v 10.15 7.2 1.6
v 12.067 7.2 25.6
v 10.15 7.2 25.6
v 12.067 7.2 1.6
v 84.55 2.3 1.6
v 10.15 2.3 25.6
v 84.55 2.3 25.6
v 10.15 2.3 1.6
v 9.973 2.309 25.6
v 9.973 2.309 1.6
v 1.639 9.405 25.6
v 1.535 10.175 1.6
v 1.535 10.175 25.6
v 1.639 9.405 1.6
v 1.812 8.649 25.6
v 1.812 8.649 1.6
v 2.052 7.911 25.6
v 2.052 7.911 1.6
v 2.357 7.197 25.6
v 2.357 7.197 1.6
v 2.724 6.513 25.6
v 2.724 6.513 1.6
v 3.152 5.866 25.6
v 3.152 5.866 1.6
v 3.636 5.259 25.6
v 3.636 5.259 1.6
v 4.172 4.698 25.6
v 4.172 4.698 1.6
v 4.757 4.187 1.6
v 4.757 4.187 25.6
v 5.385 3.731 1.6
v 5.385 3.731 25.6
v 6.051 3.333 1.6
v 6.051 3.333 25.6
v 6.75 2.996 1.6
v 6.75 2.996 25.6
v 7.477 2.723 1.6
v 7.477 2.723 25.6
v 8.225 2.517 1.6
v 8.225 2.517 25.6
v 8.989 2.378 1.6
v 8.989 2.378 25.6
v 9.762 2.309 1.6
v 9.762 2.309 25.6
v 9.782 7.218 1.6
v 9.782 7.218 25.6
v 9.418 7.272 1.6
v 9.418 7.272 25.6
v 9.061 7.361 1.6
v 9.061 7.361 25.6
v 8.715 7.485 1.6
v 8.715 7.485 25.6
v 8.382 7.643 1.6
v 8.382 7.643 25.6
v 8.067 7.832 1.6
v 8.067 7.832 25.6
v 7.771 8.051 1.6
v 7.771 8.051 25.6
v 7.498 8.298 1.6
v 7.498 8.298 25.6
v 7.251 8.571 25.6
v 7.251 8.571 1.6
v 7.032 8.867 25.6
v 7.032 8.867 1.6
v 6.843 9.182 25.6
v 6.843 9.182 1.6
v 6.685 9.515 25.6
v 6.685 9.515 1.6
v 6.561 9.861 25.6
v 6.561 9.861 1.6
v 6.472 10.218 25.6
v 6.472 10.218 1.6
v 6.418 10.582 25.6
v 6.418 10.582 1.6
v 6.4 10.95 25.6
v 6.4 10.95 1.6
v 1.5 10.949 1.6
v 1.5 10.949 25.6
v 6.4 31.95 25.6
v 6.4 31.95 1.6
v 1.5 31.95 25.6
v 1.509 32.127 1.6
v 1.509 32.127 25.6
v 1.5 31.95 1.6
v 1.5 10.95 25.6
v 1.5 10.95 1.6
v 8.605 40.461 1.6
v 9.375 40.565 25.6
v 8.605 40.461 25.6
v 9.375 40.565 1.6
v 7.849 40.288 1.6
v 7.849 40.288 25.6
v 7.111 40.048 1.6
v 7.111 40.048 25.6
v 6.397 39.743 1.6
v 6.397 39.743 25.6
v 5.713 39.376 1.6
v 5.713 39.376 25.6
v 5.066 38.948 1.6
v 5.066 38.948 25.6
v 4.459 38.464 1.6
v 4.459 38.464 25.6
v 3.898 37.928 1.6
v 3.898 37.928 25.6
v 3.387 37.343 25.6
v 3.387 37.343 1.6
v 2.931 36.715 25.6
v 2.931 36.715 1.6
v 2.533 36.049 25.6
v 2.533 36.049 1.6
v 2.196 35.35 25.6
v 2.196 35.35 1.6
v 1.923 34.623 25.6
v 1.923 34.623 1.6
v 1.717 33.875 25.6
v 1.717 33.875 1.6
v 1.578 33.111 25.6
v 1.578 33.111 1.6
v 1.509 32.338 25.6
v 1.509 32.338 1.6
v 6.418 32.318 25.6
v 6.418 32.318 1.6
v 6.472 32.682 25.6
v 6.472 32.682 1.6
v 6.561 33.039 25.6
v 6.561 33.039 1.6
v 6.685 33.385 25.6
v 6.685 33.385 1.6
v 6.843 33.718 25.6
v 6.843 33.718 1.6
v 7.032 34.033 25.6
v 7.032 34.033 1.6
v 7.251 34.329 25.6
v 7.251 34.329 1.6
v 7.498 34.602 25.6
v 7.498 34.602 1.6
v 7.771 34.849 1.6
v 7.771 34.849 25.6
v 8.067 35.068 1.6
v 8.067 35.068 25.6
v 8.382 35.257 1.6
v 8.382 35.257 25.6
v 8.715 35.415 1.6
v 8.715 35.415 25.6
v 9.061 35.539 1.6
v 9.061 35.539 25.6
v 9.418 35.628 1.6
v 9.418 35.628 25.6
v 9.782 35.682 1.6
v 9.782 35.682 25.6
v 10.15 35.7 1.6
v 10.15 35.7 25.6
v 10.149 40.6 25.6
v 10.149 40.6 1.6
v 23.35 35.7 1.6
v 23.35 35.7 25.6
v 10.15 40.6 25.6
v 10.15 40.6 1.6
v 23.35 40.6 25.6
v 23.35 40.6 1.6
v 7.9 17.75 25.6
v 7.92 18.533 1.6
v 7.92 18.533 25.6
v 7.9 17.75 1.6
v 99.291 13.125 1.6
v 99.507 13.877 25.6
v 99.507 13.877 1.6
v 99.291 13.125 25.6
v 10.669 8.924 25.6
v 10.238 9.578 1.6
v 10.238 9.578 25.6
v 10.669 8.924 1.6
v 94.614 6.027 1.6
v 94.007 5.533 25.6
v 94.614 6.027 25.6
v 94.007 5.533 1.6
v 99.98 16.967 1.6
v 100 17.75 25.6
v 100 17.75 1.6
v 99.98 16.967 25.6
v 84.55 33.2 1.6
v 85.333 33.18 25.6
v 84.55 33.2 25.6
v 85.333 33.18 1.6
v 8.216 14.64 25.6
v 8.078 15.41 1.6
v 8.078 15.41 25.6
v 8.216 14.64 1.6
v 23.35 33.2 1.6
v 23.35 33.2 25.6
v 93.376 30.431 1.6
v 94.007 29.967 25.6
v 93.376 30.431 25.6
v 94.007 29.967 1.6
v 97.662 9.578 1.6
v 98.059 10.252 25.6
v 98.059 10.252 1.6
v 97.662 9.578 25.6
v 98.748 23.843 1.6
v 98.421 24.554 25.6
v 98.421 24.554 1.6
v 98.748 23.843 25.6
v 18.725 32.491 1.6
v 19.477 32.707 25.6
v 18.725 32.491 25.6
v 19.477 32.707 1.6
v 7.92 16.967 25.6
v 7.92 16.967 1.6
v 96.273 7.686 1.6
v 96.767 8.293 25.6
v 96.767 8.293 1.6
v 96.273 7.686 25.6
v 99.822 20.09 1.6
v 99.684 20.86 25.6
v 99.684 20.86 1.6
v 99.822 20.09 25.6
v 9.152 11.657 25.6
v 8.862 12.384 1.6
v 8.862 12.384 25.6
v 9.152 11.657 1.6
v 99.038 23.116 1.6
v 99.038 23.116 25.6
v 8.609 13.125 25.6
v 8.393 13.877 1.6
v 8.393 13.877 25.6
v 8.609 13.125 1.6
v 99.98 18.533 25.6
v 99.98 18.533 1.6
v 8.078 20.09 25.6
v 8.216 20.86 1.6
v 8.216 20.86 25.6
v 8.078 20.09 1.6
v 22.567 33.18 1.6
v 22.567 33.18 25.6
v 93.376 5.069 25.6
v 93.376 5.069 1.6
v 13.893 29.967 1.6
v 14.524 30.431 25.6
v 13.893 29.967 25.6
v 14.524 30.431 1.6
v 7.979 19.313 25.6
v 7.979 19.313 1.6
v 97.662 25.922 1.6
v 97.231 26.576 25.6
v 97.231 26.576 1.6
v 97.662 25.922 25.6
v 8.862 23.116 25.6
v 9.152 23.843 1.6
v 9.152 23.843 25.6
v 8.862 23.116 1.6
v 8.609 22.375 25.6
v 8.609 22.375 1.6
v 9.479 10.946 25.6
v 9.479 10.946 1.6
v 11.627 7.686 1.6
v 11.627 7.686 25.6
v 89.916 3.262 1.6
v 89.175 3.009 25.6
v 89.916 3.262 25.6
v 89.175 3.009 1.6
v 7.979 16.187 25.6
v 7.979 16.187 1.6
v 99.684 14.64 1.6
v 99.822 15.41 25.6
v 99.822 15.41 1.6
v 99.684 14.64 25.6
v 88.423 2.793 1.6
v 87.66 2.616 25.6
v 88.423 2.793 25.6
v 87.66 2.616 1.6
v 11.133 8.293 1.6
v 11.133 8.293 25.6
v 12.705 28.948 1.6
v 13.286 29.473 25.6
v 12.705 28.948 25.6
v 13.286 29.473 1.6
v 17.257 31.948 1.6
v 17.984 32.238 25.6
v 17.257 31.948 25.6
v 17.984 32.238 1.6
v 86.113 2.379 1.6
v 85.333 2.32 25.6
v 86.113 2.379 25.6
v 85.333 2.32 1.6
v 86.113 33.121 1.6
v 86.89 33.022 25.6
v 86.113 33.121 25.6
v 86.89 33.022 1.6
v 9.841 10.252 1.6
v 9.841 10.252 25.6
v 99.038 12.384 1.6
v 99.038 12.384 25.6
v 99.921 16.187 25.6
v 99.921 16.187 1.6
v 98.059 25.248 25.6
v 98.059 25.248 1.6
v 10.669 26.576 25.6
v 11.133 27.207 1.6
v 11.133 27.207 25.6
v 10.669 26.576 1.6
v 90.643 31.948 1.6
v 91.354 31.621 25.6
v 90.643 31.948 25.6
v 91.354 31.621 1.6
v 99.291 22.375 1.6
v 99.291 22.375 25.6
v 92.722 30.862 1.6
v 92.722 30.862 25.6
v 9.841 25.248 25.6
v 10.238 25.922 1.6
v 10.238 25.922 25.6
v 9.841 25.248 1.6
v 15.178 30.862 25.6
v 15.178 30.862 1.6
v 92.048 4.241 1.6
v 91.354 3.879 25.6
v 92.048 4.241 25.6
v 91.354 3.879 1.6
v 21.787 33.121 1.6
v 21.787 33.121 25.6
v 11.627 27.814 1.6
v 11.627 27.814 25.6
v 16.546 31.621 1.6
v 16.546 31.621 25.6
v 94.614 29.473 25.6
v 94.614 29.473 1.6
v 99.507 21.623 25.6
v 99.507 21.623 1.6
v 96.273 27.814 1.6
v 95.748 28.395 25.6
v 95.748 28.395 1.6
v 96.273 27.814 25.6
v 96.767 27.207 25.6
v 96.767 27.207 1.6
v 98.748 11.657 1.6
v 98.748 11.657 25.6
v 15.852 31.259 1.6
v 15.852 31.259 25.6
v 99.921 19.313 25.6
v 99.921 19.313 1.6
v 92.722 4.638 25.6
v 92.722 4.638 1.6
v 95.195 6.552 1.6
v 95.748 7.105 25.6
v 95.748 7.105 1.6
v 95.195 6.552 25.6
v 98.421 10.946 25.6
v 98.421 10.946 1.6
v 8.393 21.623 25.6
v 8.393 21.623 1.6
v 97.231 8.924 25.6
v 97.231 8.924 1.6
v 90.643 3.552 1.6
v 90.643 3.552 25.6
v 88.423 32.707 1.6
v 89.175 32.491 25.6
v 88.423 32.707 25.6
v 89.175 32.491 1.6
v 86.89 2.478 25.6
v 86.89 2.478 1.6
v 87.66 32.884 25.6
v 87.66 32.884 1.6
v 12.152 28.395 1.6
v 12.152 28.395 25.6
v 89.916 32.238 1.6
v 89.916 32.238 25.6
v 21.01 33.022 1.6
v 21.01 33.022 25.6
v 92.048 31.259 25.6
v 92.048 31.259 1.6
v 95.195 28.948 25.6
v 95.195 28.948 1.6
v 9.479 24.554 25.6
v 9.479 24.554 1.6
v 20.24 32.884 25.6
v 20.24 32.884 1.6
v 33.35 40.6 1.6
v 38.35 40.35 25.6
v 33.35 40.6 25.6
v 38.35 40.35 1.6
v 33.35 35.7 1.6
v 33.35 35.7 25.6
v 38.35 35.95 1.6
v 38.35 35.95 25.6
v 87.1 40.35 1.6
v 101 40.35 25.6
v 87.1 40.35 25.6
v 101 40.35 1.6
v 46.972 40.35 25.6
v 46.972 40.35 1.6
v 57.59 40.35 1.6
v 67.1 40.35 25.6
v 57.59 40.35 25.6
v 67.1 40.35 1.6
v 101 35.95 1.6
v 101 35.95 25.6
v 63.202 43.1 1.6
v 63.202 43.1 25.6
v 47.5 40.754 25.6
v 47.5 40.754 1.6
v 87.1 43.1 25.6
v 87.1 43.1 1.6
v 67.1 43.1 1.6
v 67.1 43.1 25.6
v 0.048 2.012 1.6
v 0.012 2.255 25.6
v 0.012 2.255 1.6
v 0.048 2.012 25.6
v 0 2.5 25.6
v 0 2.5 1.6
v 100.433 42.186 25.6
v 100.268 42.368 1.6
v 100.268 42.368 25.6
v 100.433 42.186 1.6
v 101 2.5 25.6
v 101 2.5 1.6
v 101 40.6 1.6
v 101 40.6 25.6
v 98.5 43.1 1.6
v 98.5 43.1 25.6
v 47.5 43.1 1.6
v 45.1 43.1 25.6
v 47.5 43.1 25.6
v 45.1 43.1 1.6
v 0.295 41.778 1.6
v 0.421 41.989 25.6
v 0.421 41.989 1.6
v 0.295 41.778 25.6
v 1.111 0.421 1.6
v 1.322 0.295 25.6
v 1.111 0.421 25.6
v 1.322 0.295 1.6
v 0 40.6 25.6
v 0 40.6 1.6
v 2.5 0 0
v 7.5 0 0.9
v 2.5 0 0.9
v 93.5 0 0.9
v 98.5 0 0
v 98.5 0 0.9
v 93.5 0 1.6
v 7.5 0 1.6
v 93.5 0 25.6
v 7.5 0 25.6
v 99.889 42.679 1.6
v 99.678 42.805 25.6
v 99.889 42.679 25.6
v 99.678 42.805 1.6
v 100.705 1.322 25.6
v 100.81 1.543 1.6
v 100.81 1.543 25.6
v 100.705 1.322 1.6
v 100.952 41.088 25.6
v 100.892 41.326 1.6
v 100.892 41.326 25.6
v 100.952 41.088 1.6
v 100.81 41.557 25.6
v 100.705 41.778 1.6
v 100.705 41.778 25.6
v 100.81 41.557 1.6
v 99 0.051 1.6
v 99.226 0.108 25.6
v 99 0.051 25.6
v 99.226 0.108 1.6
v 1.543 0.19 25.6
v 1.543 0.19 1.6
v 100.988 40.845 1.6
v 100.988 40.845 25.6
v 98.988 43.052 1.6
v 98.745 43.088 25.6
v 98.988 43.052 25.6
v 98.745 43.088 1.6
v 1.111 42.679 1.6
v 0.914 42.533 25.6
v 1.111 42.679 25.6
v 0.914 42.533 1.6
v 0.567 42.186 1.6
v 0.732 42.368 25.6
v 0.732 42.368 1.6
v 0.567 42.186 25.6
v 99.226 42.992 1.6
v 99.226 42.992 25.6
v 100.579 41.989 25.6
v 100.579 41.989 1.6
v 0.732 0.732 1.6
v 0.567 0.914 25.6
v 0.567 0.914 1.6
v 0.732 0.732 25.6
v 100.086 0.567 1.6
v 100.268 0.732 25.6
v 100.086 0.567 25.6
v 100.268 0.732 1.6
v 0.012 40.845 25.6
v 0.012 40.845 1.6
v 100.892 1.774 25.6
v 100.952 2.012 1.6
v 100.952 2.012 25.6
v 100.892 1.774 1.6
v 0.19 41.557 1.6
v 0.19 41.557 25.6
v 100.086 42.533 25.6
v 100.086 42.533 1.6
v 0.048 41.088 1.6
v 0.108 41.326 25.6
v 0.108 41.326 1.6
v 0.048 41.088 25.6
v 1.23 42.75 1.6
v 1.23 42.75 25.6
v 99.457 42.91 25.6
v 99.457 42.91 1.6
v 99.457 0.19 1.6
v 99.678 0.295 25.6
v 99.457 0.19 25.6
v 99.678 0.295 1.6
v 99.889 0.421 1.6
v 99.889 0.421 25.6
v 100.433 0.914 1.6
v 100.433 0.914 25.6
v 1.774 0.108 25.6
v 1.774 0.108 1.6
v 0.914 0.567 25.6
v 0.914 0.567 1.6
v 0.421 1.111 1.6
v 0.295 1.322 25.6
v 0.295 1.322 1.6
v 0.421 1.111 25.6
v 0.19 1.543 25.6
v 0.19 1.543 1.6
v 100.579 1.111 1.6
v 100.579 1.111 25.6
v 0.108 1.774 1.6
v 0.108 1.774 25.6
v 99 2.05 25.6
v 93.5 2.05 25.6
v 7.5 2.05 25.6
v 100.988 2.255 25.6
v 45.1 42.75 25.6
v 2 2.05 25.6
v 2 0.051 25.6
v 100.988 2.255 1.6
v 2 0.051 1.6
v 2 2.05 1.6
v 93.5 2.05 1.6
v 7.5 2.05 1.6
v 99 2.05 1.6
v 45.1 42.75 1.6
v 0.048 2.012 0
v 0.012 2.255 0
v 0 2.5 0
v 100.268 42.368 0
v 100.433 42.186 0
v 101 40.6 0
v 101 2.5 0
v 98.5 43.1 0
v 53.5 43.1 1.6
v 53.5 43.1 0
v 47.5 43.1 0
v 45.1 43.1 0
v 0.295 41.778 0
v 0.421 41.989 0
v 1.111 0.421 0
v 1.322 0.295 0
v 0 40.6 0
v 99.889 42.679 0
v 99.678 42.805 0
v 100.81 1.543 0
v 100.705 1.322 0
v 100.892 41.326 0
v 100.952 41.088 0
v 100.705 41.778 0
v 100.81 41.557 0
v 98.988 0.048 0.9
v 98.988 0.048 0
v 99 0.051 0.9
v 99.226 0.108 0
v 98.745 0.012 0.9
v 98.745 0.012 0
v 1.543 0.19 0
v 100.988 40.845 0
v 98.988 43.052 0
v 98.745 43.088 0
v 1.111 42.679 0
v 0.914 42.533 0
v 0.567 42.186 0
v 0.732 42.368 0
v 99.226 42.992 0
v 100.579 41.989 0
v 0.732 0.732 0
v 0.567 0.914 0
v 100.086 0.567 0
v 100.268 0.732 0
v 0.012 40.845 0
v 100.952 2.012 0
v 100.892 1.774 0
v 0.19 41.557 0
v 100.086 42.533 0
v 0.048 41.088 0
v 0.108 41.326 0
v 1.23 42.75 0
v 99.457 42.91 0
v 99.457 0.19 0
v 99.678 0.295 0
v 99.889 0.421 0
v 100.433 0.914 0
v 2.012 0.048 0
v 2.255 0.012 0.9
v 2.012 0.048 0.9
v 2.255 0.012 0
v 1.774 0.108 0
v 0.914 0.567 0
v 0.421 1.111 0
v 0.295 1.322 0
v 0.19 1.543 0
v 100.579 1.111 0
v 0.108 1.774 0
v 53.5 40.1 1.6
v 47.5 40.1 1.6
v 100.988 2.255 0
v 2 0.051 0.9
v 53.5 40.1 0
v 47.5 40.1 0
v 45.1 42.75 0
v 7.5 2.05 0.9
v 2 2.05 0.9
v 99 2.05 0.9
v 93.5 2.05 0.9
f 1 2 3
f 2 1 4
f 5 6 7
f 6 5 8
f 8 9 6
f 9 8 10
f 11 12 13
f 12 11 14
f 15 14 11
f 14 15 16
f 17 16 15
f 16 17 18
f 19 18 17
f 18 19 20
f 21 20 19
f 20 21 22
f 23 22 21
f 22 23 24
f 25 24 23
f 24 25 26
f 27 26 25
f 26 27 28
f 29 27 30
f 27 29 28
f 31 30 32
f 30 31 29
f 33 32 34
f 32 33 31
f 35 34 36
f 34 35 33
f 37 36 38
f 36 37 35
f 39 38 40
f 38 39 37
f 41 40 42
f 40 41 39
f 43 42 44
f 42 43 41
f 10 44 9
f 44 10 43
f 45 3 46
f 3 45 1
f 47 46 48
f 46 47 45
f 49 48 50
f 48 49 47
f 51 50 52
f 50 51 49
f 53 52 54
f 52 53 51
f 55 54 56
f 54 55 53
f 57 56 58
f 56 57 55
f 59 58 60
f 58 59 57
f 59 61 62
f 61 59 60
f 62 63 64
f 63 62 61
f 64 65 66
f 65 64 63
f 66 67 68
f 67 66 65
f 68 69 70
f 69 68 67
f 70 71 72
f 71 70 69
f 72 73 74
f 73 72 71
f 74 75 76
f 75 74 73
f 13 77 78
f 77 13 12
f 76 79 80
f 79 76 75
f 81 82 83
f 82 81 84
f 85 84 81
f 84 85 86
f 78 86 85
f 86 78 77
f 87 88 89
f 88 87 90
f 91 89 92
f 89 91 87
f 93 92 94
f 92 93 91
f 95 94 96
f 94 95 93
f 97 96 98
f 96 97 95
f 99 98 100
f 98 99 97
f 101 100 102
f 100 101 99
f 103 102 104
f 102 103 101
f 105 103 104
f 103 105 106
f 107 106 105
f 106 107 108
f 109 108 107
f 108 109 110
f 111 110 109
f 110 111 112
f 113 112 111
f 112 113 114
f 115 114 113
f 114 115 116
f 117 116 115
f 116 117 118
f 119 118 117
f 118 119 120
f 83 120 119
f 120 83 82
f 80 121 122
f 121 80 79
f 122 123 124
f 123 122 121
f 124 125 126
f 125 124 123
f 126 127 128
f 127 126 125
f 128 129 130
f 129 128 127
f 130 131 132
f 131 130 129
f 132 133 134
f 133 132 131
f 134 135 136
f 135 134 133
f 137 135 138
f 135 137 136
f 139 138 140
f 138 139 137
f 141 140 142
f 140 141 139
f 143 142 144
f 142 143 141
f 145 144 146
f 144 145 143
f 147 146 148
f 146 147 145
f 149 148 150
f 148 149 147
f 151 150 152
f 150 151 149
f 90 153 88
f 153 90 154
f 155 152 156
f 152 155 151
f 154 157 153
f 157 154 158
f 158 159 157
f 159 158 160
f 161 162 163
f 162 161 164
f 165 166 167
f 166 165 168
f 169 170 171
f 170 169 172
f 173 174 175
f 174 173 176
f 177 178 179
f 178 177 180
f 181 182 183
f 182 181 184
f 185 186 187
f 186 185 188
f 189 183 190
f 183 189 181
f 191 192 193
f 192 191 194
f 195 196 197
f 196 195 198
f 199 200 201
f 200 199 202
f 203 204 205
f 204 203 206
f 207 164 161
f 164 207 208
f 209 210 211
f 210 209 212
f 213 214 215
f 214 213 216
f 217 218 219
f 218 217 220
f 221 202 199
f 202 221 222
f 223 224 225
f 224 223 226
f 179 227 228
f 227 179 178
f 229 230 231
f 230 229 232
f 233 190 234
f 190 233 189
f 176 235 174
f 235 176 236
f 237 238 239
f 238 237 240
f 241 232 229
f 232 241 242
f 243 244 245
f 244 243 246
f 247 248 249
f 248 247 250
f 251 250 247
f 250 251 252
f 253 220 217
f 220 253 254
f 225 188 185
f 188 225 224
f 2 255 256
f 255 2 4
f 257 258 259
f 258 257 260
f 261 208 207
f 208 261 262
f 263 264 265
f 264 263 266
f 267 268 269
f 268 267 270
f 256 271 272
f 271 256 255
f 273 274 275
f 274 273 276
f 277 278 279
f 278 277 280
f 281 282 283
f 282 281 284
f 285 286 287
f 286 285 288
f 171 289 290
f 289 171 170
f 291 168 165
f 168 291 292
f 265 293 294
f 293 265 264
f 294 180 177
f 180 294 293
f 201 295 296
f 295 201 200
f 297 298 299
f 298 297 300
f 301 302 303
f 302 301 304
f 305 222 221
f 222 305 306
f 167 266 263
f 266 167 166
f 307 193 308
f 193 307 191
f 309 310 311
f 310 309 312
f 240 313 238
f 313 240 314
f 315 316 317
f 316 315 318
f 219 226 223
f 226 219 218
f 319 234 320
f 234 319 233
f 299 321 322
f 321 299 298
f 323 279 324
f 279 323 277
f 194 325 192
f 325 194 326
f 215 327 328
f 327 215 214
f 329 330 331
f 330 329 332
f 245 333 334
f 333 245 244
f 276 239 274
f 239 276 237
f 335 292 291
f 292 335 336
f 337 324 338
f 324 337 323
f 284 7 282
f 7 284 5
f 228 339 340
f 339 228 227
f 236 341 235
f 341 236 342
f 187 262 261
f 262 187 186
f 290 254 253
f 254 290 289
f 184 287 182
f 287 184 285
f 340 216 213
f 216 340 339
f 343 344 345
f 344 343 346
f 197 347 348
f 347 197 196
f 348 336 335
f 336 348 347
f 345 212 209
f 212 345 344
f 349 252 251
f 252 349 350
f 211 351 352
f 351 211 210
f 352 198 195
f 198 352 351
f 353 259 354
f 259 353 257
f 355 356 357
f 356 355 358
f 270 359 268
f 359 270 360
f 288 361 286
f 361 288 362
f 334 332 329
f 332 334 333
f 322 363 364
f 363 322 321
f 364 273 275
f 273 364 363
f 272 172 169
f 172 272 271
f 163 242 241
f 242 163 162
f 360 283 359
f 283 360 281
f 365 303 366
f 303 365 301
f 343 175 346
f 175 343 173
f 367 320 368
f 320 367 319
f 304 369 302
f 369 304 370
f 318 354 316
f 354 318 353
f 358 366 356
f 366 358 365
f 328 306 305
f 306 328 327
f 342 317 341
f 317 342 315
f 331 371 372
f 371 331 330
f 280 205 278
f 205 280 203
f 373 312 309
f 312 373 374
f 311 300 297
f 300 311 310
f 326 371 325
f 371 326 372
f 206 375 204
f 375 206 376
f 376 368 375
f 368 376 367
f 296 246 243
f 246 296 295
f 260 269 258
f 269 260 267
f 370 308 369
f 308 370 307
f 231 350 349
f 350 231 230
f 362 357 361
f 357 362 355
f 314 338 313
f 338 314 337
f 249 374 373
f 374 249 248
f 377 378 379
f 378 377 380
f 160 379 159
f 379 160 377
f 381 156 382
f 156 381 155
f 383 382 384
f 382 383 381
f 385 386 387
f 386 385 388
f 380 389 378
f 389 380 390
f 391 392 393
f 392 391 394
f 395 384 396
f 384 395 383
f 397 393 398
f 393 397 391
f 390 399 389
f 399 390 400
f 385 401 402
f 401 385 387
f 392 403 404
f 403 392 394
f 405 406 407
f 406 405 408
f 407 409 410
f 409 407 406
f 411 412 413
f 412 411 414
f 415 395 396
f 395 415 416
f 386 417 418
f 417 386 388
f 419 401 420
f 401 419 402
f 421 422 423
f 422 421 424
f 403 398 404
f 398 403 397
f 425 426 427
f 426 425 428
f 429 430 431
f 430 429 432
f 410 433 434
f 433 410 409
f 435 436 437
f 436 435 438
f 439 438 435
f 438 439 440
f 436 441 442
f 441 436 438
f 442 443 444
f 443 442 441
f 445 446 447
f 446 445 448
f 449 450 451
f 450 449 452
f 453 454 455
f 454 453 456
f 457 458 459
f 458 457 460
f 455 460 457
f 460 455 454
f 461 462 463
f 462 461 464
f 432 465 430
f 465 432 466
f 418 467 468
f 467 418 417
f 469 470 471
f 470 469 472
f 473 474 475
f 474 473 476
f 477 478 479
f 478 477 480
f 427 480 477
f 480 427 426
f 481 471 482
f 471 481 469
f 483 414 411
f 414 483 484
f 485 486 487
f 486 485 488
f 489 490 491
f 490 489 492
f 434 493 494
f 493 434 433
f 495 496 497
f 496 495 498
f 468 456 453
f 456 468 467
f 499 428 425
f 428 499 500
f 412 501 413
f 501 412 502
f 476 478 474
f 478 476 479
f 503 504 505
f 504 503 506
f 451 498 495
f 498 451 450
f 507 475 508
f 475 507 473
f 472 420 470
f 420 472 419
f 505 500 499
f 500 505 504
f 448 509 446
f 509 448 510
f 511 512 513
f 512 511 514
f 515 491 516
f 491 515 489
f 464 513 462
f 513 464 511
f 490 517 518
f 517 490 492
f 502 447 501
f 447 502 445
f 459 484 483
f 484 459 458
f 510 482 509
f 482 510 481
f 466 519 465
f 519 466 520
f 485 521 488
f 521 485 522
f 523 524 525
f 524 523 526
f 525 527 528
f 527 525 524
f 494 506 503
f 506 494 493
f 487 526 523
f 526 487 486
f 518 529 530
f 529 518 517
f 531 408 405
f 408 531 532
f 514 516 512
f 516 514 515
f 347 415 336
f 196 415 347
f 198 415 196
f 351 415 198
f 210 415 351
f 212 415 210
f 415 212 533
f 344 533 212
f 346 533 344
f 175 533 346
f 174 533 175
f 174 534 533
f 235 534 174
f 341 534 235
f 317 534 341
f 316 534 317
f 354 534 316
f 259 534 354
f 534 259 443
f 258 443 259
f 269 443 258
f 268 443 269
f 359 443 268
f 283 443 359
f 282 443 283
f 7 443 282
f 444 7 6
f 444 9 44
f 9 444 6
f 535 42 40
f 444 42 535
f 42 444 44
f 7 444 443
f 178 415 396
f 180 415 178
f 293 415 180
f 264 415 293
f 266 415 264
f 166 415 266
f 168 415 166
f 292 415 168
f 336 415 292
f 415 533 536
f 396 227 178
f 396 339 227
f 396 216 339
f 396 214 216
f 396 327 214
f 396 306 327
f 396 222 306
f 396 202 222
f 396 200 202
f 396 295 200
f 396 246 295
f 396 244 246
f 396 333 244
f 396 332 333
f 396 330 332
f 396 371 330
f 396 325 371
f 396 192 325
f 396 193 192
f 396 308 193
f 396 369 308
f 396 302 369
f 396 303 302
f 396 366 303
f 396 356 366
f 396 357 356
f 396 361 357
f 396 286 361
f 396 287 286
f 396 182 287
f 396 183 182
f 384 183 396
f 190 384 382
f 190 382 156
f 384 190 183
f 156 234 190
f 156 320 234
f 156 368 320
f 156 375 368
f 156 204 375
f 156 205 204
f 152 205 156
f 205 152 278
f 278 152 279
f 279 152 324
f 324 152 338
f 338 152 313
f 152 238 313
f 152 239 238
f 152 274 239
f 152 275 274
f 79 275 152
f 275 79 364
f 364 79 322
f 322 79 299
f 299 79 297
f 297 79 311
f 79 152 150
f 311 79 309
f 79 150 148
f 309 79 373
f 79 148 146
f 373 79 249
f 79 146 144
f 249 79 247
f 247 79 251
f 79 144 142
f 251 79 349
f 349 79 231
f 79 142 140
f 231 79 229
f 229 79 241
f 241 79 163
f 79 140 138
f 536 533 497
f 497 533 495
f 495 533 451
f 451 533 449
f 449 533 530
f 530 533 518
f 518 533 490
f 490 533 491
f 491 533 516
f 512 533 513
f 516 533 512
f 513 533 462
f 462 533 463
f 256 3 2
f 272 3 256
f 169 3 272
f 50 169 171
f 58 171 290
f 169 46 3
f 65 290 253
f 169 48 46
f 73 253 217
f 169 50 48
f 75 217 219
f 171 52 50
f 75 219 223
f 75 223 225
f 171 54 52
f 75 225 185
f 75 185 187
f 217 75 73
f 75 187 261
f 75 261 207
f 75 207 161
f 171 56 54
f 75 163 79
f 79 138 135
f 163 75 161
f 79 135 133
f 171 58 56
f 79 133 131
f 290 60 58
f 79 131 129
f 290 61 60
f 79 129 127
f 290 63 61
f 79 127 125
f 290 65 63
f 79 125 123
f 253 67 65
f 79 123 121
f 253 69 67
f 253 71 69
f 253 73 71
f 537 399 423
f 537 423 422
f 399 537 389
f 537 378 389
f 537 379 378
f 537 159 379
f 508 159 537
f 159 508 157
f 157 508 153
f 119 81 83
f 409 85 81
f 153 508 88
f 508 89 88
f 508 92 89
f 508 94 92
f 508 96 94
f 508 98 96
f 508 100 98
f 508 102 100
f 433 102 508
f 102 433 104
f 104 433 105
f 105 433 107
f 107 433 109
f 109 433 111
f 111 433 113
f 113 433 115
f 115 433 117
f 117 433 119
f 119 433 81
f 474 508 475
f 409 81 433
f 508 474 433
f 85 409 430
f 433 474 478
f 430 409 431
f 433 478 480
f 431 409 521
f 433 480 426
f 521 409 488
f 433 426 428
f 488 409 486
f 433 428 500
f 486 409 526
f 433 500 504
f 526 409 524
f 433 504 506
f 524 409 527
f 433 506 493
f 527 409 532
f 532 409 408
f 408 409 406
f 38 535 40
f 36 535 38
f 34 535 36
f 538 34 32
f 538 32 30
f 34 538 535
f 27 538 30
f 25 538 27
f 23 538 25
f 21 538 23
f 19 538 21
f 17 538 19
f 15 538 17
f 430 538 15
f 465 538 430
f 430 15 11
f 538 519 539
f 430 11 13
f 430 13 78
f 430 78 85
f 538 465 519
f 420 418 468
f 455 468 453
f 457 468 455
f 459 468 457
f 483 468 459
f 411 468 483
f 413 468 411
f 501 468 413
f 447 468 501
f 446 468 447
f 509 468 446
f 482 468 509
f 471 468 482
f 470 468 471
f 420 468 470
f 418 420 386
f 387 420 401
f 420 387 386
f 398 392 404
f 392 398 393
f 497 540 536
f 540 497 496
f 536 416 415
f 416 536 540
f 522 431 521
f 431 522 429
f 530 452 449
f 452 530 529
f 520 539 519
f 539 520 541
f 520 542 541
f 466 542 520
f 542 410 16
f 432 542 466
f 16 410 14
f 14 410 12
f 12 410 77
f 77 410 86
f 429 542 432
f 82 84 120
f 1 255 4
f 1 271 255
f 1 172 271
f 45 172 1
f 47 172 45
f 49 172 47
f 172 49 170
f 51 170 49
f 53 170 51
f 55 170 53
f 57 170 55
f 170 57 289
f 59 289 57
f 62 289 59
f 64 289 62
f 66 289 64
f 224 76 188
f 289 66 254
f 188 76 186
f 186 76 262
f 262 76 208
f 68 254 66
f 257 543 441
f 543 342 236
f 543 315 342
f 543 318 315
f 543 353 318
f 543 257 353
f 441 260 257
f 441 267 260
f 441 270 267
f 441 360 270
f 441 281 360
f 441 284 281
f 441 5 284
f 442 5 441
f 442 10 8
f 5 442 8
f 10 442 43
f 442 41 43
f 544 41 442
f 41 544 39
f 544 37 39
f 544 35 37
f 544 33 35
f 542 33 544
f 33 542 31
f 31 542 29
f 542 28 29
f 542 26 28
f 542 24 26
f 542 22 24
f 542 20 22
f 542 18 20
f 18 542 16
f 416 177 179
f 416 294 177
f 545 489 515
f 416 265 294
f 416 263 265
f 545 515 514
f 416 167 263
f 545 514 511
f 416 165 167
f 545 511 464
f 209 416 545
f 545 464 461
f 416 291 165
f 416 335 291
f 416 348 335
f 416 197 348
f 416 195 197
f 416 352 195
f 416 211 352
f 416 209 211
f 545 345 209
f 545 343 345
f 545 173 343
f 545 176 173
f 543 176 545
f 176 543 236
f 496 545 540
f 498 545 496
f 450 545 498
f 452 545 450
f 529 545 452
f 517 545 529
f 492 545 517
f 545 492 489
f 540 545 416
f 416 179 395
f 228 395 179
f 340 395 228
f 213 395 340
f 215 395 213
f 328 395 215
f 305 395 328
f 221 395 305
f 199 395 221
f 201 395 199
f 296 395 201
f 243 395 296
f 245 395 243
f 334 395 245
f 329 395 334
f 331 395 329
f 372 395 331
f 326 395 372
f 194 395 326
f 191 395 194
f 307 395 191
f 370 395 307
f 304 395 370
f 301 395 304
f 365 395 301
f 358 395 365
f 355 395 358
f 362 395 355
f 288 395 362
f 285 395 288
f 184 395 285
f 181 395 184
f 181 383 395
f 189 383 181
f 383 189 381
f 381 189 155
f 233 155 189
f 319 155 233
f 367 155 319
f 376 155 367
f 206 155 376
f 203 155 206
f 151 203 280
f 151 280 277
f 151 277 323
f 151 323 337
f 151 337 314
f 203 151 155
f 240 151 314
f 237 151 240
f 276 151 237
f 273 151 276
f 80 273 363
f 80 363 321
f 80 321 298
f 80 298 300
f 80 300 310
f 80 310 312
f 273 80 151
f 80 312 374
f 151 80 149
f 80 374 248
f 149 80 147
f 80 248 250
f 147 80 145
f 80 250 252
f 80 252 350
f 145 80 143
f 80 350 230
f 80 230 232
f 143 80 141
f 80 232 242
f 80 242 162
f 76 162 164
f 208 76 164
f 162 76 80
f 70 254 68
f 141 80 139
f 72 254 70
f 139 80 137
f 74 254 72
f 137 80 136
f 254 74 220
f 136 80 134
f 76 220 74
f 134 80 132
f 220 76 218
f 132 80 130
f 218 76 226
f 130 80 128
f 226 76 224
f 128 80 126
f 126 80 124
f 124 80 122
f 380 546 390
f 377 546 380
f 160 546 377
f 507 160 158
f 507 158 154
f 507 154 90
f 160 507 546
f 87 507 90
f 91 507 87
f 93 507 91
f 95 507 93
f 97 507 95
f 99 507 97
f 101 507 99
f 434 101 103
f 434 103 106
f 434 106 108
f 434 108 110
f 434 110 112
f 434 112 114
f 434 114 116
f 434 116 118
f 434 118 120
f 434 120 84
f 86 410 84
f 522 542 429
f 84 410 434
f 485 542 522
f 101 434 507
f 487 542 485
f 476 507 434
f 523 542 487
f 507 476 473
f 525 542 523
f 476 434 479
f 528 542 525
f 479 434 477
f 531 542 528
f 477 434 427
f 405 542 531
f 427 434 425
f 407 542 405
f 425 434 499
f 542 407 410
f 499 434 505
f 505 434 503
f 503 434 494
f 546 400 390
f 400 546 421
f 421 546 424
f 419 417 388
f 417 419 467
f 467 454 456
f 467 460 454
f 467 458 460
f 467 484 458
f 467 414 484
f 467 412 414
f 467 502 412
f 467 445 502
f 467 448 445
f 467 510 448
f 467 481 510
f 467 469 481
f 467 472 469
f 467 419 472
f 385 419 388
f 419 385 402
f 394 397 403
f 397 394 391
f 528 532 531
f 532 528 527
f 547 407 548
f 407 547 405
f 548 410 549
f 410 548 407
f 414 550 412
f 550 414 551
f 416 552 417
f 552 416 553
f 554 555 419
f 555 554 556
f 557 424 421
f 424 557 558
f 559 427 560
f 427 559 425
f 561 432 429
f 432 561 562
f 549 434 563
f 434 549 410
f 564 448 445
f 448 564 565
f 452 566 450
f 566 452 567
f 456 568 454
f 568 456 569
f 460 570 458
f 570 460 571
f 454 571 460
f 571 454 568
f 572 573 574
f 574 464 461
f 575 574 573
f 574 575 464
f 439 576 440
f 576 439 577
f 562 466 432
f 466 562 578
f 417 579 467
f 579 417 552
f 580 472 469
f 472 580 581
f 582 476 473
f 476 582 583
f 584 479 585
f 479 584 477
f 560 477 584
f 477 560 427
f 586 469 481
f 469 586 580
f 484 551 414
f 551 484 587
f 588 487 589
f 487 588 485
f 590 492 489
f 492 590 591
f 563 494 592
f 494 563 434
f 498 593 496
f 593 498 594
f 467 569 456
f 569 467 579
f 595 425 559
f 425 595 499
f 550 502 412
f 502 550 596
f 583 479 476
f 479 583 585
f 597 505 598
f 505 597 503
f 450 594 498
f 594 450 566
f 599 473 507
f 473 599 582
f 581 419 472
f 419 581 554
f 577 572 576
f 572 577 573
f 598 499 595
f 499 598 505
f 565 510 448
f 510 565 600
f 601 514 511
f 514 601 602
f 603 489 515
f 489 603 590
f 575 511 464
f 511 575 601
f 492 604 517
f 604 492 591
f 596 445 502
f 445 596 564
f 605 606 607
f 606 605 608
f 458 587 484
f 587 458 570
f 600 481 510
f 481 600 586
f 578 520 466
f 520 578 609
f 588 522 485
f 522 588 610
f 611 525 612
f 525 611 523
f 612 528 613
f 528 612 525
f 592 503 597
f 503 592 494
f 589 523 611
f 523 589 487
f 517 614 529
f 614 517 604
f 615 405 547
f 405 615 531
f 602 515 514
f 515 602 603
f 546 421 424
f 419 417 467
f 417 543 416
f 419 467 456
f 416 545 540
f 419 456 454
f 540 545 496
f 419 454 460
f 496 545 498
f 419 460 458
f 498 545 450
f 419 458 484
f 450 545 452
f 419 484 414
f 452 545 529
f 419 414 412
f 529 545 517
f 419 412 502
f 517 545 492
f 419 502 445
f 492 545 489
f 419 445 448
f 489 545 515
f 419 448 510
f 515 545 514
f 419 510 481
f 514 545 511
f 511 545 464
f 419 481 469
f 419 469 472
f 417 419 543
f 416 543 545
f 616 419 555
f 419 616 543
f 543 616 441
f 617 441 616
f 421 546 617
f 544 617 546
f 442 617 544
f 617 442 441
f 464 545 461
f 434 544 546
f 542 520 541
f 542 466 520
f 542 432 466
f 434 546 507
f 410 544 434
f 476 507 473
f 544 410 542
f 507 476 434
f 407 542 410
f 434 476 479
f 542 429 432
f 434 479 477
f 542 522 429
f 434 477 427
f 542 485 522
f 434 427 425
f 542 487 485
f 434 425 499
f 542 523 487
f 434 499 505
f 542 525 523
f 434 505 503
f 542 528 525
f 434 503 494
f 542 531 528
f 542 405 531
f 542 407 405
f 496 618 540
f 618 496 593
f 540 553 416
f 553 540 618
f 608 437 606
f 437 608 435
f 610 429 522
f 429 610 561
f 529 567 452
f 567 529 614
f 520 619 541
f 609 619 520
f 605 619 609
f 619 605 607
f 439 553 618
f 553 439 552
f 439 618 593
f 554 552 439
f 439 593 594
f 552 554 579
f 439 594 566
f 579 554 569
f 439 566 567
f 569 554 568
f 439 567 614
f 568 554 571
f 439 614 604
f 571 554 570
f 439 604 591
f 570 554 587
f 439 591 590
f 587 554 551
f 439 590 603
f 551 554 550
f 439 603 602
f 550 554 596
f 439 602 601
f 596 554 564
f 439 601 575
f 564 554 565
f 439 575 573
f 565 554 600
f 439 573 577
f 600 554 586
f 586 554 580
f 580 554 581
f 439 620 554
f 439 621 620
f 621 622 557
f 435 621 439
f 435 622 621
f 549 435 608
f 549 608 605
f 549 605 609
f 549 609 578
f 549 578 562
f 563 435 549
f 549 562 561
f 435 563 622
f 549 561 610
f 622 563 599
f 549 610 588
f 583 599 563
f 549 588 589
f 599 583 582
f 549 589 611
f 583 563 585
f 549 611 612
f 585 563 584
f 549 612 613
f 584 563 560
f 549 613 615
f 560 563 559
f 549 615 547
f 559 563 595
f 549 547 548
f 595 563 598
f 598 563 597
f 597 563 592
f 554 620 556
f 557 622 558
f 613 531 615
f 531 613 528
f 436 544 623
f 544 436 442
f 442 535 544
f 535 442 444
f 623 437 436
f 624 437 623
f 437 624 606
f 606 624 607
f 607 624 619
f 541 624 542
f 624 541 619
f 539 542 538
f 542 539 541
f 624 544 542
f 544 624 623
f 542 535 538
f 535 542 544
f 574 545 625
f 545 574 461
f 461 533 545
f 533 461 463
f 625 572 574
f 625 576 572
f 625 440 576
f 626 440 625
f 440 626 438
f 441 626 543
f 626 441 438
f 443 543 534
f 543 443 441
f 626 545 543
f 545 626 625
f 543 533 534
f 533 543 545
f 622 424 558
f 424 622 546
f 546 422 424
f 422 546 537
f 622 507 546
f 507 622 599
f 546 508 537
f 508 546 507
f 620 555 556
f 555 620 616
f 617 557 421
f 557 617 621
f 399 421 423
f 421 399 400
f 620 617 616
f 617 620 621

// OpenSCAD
module Path(){
  translate([0, 0, -0.002])union(){
      translate([0, 0, -0.002])hull(){
          translate([0, 0, -0.002])cylinder(d=4.9,h=25.008,$fn=64);
          translate([-13.2, 0, -0.002])cylinder(d=4.9,h=25.008,$fn=64);
        }

      translate([-13.2, 0, -0.002])linear_extrude(height=25.004)translate([0, 6.2, 0])rotate([0, 0, 180])intersection(){
                difference(){
                  circle(d=17.3,$fn=70);
                  circle(d=7.5,$fn=64);
                }

                polygon(points=[[0, 0], [0, 0.173e2], [0.173e2, 0.1059319481262460518e-14]],convexity=10);
              }

      translate([0, 0, -0.002])hull(){
          translate([-19.4, 6.199999999999998, -0.002])cylinder(d=4.9,h=25.008,$fn=64);
          translate([-19.4, 27.2, -0.002])cylinder(d=4.9,h=25.008,$fn=64);
        }

      translate([-19.4, 27.2, -0.002])linear_extrude(height=25.004)translate([6.2, 0, 0])rotate([0, 0, 90])intersection(){
                difference(){
                  circle(d=17.3,$fn=70);
                  circle(d=7.5,$fn=64);
                }

                polygon(points=[[0, 0], [0, 0.173e2], [0.173e2, 0.1059319481262460518e-14]],convexity=10);
              }

      translate([0, 0, -0.002])hull(){
          translate([-13.200000000000001, 33.4, -0.002])cylinder(d=4.9,h=25.008,$fn=64);
          translate([-7.592810154713589e-16, 33.4, -0.002])cylinder(d=4.9,h=25.008,$fn=64);
        }

    }
}
module GridSegment_extra_w_1_0_extra_len_2_h_1_5_w_2_08_repeat_x_2_repeat_y_1_lid_extra_w_1_0_lid_extra_h_0_4_no_bottom_true(){
  translate([25.85, 25.85, 0])union(){
      translate([0, 0, 45])%linear_extrude(height=1)union(){
            translate([-25.85, -25.85, 0])square([51.7, 51.7]);
            translate([-25.85, -25.85, 0])square([51.7, 51.7]);
            translate([27.85, -25.85, 0])square([51.7, 51.7]);
          }

      translate([0, 0, 41.5])color("blue")linear_extrude(height=3.5)union(){
              translate([-21.6, 22.95, 0])square([43.2, 2.2]);
              translate([-21.6, -25.15, 0])square([43.2, 2.2]);
              translate([22.95, -21.6, 0])square([2.2, 43.2]);
              translate([-25.15, -21.6, 0])square([2.2, 43.2]);
              union(){
                translate([-21.6, 22.95, 0])square([43.2, 2.2]);
                translate([-21.6, -25.15, 0])square([43.2, 2.2]);
                translate([22.95, -21.6, 0])square([2.2, 43.2]);
                translate([-25.15, -21.6, 0])square([2.2, 43.2]);
              }

              translate([53.7, 0, 0])union(){
                  translate([-21.6, 22.95, 0])square([43.2, 2.2]);
                  translate([-21.6, -25.15, 0])square([43.2, 2.2]);
                  translate([22.95, -21.6, 0])square([2.2, 43.2]);
                  translate([-25.15, -21.6, 0])square([2.2, 43.2]);
                }

            }

    }
}
module SmdDispenser_strip_h_24_strip_w_4_0(){
  difference(){
    color("pink")union(){
        translate([0, 0, 1.6])difference(){
            union()linear_extrude(height=24)translate([2.5, 2.5, 0])hull(){
                    circle(d=5,$fn=64);
                    translate([96, 0, 0])circle(d=5,$fn=64);
                    translate([0, 38.1, 0])circle(d=5,$fn=64);
                    translate([96, 38.1, 0])circle(d=5,$fn=64);
                  }

            translate([23.35, 38.15, -0.002])union(){
                translate([7.592810154713589e-16, -33.4, -0.002])union(){
                    translate([0, 0, -0.002])Path();
                    translate([0, 13, 0])hull(){
                        translate([0, 0, -0.1])cylinder(d=30.9,h=25.208,$fn=124);
                        translate([61.2, 0, -0.1])cylinder(d=30.9,h=25.408,$fn=124);
                      }

                  }

                translate([0, 0, -0.004])hull(){
                    translate([0, -2.45, -0.004])cube([10, 4.9, 24.016]);
                    translate([5, -2.2, -0.004])cube([10, 4.4, 24.016]);
                  }

                translate([0, -2.2, -0.004])color("blue")cube([101, 4.4, 24.016]);
                translate([29.75, 0, -0.004])linear_extrude(height=24.008)hull(){
                      translate([7, 12.25, 0])square([18, 0.001]);
                      translate([-9, 0, 0])square([9, 0.001]);
                    }

                translate([43.75, 0, -0.1])cube([20, 14.7, 25.208]);
              }

          }

        union()linear_extrude(height=1.6)translate([2.5, 2.5, 0])hull(){
                circle(d=5,$fn=64);
                translate([96, 0, 0])circle(d=5,$fn=64);
                translate([0, 38.1, 0])circle(d=5,$fn=64);
                translate([96, 38.1, 0])circle(d=5,$fn=64);
              }

      }

    translate([-0.1, 42.75, -0.1])color("silver")cube([45.2, 0.5, 26.8]);
    translate([0, 0, 1])color("OrangeRed")union(){
          translate([2, 0, -0.1])cube([5.5, 2.05, 26.8]);
          translate([93.5, 0, -0.1])cube([5.5, 2.05, 27]);
        }

    translate([0, 0, -5])mirror([])rotate([90, 0, 0])translate([-2.40000000000001, 0, -1.5])GridSegment_extra_w_1_0_extra_len_2_h_1_5_w_2_08_repeat_x_2_repeat_y_1_lid_extra_w_1_0_lid_extra_h_0_4_no_bottom_true();
    translate([47.5, 40.1, -0.002])color("purple")cube([6, 6, 25.608]);
  }
}
$fn=64;
SmdDispenser_strip_h_24_strip_w_4_0();
